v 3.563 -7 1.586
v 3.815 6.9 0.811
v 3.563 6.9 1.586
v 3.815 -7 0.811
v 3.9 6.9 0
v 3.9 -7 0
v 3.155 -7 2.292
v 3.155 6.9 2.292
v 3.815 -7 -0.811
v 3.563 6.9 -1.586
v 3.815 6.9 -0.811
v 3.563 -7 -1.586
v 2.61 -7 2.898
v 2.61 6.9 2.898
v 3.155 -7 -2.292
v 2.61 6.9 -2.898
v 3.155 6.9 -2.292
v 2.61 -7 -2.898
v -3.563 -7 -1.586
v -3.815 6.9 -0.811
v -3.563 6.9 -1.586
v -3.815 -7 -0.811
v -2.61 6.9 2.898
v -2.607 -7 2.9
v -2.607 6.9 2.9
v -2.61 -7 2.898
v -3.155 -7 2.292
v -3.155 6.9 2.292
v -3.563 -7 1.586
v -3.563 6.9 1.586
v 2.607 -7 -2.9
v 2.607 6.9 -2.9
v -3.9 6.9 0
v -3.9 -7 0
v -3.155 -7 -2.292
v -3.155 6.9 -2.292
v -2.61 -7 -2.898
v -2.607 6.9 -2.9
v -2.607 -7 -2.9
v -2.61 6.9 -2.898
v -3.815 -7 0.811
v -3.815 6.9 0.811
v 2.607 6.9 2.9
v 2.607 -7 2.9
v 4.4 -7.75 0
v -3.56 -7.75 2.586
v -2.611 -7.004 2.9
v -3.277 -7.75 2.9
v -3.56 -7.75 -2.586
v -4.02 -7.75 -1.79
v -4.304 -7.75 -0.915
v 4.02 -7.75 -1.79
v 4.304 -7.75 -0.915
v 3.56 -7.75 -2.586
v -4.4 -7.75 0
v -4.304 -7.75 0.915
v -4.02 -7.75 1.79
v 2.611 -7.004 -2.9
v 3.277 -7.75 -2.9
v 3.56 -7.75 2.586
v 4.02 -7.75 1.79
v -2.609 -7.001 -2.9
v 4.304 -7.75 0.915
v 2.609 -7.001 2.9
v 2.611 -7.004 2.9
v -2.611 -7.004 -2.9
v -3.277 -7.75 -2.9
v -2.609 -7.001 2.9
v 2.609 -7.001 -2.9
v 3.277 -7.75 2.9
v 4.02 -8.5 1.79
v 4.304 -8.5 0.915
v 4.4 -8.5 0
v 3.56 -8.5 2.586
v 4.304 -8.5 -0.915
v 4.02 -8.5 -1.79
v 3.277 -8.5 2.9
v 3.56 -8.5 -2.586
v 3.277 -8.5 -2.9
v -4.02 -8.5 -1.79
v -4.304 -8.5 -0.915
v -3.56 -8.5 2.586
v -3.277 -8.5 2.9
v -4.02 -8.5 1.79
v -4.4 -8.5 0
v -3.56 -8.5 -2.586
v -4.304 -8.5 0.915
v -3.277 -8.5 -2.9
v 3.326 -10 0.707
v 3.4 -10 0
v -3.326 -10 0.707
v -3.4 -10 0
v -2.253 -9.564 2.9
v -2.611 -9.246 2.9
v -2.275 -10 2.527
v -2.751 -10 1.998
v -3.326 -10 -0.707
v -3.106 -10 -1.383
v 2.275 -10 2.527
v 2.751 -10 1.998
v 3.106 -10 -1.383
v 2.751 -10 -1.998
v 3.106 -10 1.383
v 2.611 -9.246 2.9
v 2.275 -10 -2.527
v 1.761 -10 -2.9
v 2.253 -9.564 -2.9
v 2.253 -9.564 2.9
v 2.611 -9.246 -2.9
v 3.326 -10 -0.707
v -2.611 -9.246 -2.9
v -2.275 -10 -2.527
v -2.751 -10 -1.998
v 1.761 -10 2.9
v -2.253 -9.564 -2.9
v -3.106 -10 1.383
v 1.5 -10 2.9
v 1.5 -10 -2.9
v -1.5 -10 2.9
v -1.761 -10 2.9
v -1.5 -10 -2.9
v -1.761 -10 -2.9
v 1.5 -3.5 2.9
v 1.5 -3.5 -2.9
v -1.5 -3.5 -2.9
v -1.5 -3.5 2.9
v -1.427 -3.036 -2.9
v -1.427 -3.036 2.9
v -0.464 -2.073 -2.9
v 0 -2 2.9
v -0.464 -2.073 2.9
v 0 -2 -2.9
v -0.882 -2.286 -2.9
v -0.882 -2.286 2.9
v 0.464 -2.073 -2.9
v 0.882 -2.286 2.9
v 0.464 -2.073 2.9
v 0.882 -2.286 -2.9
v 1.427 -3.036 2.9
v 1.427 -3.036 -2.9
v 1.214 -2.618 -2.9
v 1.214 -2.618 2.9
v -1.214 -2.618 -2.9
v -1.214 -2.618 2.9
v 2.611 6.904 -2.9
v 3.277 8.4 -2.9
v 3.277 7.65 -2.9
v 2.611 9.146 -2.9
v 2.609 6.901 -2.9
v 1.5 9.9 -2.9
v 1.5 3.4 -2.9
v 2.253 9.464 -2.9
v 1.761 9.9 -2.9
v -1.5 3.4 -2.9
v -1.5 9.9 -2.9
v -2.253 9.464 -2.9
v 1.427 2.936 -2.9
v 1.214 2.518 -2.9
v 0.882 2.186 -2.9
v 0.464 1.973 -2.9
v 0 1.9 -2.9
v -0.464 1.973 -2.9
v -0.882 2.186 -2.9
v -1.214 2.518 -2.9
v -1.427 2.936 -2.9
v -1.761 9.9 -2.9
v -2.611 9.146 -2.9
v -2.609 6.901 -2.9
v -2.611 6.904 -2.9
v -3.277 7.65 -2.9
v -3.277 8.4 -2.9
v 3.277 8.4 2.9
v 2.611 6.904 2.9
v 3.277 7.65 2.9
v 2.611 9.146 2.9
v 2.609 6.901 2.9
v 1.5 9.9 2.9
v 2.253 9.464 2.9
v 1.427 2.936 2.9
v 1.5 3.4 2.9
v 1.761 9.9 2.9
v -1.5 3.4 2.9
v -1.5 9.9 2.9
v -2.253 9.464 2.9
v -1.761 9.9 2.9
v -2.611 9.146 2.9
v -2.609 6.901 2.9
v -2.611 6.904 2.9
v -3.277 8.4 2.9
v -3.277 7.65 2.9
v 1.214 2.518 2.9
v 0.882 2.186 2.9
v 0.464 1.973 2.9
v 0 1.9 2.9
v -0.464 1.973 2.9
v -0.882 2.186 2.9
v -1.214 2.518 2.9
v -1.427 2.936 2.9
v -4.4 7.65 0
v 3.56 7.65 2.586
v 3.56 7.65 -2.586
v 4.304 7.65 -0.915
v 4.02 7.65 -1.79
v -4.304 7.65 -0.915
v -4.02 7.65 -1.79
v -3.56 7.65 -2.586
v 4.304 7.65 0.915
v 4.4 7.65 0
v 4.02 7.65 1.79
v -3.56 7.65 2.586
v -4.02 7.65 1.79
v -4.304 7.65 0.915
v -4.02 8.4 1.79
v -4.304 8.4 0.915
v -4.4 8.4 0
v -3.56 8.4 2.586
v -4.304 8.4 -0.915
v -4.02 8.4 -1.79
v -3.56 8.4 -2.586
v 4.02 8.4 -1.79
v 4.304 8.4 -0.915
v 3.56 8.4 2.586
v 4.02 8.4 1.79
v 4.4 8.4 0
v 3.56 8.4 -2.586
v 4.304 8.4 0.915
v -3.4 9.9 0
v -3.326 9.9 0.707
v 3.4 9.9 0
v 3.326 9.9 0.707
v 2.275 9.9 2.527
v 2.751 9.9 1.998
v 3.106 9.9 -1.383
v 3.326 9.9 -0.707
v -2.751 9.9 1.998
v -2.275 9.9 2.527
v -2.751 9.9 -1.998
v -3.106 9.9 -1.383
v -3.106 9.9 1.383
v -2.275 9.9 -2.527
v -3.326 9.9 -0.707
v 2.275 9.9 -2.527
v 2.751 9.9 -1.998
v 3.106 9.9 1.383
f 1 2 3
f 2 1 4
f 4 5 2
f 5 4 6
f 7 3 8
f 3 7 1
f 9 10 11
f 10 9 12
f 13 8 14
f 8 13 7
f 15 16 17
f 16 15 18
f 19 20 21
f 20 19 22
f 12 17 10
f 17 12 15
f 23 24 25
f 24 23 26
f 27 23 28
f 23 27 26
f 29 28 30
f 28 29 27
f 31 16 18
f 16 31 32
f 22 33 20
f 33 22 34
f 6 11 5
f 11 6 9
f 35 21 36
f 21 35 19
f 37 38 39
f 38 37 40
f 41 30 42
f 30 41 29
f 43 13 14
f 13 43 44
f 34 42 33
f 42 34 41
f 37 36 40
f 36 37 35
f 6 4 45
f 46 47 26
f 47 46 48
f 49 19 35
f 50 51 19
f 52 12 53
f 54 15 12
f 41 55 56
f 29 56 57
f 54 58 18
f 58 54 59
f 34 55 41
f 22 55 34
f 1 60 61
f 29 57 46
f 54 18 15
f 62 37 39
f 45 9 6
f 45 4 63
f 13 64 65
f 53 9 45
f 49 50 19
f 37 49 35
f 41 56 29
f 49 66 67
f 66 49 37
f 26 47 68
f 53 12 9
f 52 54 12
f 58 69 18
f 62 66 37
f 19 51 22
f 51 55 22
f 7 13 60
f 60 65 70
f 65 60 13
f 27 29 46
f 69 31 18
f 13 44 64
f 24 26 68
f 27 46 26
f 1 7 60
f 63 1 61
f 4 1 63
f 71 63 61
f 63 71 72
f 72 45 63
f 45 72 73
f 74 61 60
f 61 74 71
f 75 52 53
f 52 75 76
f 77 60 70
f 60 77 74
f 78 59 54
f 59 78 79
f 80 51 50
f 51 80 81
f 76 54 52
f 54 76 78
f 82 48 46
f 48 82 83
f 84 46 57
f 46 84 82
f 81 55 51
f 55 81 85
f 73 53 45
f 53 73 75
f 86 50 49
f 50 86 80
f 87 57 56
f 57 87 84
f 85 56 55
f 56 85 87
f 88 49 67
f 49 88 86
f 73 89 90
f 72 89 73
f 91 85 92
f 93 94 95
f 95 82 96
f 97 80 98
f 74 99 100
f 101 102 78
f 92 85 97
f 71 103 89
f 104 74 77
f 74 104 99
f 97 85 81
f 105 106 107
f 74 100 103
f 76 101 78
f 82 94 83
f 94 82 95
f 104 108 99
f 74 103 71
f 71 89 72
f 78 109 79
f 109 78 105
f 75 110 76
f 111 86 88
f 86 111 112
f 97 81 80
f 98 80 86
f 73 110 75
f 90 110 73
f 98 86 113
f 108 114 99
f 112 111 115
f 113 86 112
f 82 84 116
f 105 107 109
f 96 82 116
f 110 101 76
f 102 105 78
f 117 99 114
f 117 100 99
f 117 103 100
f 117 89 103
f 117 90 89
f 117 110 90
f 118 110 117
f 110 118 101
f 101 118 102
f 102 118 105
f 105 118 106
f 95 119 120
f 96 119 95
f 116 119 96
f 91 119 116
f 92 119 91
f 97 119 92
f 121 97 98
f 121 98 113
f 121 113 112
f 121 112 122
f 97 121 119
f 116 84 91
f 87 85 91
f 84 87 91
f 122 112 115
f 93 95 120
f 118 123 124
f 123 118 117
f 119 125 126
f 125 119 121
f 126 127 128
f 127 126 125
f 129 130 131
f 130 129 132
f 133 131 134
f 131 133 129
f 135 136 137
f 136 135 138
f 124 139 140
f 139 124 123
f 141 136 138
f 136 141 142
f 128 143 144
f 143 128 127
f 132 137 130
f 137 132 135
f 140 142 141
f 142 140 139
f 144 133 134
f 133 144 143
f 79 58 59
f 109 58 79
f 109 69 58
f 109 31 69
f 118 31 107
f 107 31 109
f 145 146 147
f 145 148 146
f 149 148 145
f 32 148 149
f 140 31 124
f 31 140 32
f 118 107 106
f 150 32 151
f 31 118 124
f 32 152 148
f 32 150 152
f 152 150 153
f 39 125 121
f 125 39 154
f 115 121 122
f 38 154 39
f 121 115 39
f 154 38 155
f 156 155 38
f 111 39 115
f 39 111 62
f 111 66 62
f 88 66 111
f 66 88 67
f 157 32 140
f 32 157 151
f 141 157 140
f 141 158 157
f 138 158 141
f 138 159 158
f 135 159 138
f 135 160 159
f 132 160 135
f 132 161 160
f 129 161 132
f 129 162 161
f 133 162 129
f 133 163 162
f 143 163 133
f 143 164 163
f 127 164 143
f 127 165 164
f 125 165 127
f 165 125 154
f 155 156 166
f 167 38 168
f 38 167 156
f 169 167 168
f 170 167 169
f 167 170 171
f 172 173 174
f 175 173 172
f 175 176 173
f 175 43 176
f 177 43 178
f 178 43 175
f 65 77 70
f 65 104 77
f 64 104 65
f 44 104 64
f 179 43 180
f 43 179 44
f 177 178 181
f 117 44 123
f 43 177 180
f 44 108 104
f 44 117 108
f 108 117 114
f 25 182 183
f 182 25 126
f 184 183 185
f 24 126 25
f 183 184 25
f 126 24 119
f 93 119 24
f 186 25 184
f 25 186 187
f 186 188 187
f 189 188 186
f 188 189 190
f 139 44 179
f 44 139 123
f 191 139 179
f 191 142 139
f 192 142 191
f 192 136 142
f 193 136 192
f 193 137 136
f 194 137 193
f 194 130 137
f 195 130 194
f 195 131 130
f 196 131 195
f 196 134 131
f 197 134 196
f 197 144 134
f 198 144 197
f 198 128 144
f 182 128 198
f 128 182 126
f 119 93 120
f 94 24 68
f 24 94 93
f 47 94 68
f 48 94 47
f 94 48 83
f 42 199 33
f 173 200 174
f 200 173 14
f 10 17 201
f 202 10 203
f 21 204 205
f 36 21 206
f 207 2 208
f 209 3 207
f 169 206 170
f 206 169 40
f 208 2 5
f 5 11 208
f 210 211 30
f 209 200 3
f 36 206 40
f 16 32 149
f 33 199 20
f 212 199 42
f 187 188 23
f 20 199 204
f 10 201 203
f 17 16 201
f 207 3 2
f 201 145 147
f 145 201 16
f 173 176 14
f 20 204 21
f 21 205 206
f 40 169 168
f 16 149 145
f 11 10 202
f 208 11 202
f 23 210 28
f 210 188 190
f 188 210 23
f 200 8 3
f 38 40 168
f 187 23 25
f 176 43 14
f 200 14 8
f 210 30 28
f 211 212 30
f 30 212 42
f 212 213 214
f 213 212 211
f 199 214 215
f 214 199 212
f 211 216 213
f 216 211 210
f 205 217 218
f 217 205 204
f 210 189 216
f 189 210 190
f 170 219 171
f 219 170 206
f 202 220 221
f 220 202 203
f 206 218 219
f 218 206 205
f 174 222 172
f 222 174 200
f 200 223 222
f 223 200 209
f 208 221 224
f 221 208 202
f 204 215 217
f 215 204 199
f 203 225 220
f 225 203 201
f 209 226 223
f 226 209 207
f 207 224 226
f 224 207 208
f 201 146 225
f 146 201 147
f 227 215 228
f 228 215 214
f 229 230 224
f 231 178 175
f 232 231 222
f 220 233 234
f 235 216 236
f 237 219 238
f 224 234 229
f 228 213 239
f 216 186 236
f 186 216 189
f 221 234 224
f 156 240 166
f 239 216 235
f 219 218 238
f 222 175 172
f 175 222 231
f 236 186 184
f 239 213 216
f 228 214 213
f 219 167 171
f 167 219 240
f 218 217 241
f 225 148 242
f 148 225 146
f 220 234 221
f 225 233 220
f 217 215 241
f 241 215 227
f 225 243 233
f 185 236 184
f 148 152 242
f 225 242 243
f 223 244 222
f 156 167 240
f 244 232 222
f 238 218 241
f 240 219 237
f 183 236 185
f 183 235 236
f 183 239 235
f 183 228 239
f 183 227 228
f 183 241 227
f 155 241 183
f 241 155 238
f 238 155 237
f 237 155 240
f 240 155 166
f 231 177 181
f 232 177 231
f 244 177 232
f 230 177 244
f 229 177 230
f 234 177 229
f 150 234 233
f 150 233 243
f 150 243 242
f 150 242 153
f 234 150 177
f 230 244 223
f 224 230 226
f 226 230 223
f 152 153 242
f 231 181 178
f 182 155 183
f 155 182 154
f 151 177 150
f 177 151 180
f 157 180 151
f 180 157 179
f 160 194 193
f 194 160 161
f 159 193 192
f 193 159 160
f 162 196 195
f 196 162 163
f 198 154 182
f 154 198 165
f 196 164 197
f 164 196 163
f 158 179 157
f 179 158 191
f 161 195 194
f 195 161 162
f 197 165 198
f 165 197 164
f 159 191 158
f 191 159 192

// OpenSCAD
// file: pin_joints.scad
include <pins.scad>

// default is 0.3
tolerance = 0.3;

// pinpeg(h=40);
// pin();
// pin(side=true);
// pinhole(t=tolerance);
// pintack(h=10, r=4);
//pins();

// wheel();
// translate([-25/2, 0, 0]) axel_tight();
// translate([-25/2, 0, 0]) axel_loose();
// translate([-25/2, 0, 0]) axel_loose_and_tight();
//plate();
//plate_simple();

module pins() {
  translate([-21, 0, 0]) pinpeg(h=20);
  translate([0, 0, 0]) pintack(h=11);
  translate([21, 0, 0]) pintack(h=11);
}

module wheel() {
  difference() {
    union() {
      translate([0, 0, 10]) cylinder(h=5, r1=20/2, r2=17/2);
      translate([0, 0, 5]) cylinder(h=5, r=20/2);
      translate([0, 0, 0]) cylinder(h=5, r1=17/2, r2=20/2);
    }

    translate([0, 0, 11]) cylinder(h=15, r=13/2);    
    pinhole(h=5, t=tolerance);
  }  
}

module axel_tight() {
  difference() {
    union() {
      translate([0, -2.5, 0]) cube([25, 5, 5]);
      cylinder(h=5, r=5*1.75);
      translate([25, 0, 0]) cylinder(h=12, r=5*1.75);
    }
  
    pinhole(h=5, t=tolerance);
    translate([25, 0, 10+2]) rotate([180, 0, 0]) pinhole(h=8, t=tolerance);
  }
}

module axel_loose() {
  difference() {
    union() {
      translate([0, -2.5, 0]) cube([25, 5, 5]);
      cylinder(h=5, r=5*1.75);
      translate([25, 0, 0]) cylinder(h=5, r=5*1.75);
    }
  
    translate([0, 0, 5]) rotate([180, 0, 0]) pinhole(h=5, t=tolerance, tight=false);
    translate([25, 0, 0]) pinhole(h=5, t=tolerance, tight=false);
  }
}

module axel_loose_and_tight() {
  difference() {
    union() {
      translate([0, -2.5, 0]) cube([25, 5, 5]);
      cylinder(h=5, r=5*1.75);
      translate([25, 0, 0]) cylinder(h=5, r=5*1.75);
    }
  
    pinhole(h=10, t=tolerance);
    translate([25, 0, 0]) pinhole(h=10, t=tolerance, tight=false);
  }
}

module plate() {
  %translate([0, 0, -0.5]) cube([100, 100, 1], center=true);
  
  translate([0, 21, 0]) pins();

  translate([-21, 0, 0]) wheel();

  translate([-21, -21, 0]) wheel();

  translate([0, 0, 0]) axel_tight();

  translate([0, -20, 0]) axel_loose();
}

module plate_simple() {
  %translate([0, 0, -0.5]) cube([100, 100, 1], center=true);
  
 translate([-10.5, 10.5, 0]) pintack(h=11);
 translate([10.5, 10.5, 0]) pintack(h=11);
 translate([-25/2, -10.5, 0]) axel_loose_and_tight();
  
}
// file: pins.scad
// Pin Connectors V3
// Tony Buser <tbuser@gmail.com>
// Modified by Emmett Lalish

//pinhole(tight=true,fixed=false);
//pin_vertical();

// test();
// pintack(h=10);
// pinpeg(h=20);


module test() {
  tolerance = 0.3;
  
  translate([-12, 12, 0]) pinpeg(h=20);
  translate([12, 12, 0]) pintack(h=10);
  
  difference() {
    union() {
      translate([0, -12, 2.5]) cube(size = [59, 20, 5], center = true);
      translate([24, -12, 7.5]) cube(size = [12, 20, 15], center = true);
    }
    translate([-24, -12, 0]) pinhole(h=5, t=tolerance);
    translate([-12, -12, 0]) pinhole(h=5, t=tolerance, tight=false);
    translate([0, -12, 0]) pinhole(h=10, t=tolerance);
    translate([12, -12, 0]) pinhole(h=10, t=tolerance, tight=false);
    translate([24, -12, 15]) rotate([0, 180, 0]) pinhole(h=10, t=tolerance);
  }
}

module pinhole(h=10, r=4, lh=3, lt=1, t=0.3, tight=true, fixed=false) {
  // h = shaft height
  // r = shaft radius
  // lh = lip height
  // lt = lip thickness
  // t = extra tolerance for loose fit
  // tight = set to false if you want a joint that spins easily
  // fixed = set to true so pins can't spin
  
intersection(){
  union() {
	if (tight == true || fixed == true) {
      pin_solid(h, r, lh, lt);
	  translate([0,0,-t/2])cylinder(h=h+t, r=r, $fn=30);
	} else {
	  pin_solid(h, r+t/2, lh, lt);
	  translate([0,0,-t/2])cylinder(h=h+t, r=r+t/2, $fn=30);
	}
    
    
    // widen the entrance hole to make insertion easier
    //translate([0, 0, -0.1]) cylinder(h=lh/3, r2=r, r1=r+(t/2)+(lt/2),$fn=30);
  }
  if (fixed == true) {
	translate([-r*2, -r*0.75, -1])cube([r*4, r*1.5, h+2]);
  }
}}

module pin(h=10, r=4, lh=3, lt=1, t=0.2, side=false) {
  // h = shaft height
  // r = shaft radius
  // lh = lip height
  // lt = lip thickness
  // side = set to true if you want it printed horizontally

  if (side) {
    pin_horizontal(h, r, lh, lt, t);
  } else {
    pin_vertical(h, r, lh, lt, t);
  }
}

module pintack(h=10, r=4, lh=3, lt=1, t=0.2, bh=3, br=8.75) {
  // bh = base_height
  // br = base_radius
  
  union() {
    cylinder(h=bh, r=br);
    translate([0, 0, bh]) pin(h, r, lh, lt, t);
  }
}

module pinpeg(h=20, r=4, lh=3, lt=1, t=0.2) {
  union() {
    translate([0,-0.05, 0]) pin(h/2+0.1, r, lh, lt, t, side=true);
    translate([0,0.05, 0]) rotate([0, 0, 180]) pin(h/2+0.1, r, lh, lt, t, side=true);
  }
}

// just call pin instead, I made this module because it was easier to do the rotation option this way
// since openscad complains of recursion if I did it all in one module
module pin_vertical(h=10, r=4, lh=3, lt=1, t=0.2) {
  // h = shaft height
  // r = shaft radius
  // lh = lip height
  // lt = lip thickness

  difference() {
    pin_solid(h, r-t/2, lh, lt);
    
    // center cut
    translate([-lt*3/2, -(r*2+lt*2)/2, h/5+lt*3/2]) cube([lt*3, r*2+lt*2, h]);
    //translate([0, 0, h/4]) cylinder(h=h+lh, r=r/2.5, $fn=20);
    // center curve
    translate([0, 0, h/5+lt*3/2]) rotate([90, 0, 0]) cylinder(h=r*2, r=lt*3/2, center=true, $fn=20);
  
    // side cuts
    translate([-r*2, -r-r*0.75+t/2, -1]) cube([r*4, r, h+2]);
    translate([-r*2, r*0.75-t/2, -1]) cube([r*4, r, h+2]);
  }
}

// call pin with side=true instead of this
module pin_horizontal(h=10, r=4, lh=3, lt=1, t=0.2) {
  // h = shaft height
  // r = shaft radius
  // lh = lip height
  // lt = lip thickness
  translate([0, 0, r*0.75-t/2]) rotate([-90, 0, 0]) pin_vertical(h, r, lh, lt, t);
}

// this is mainly to make the pinhole module easier
module pin_solid(h=10, r=4, lh=3, lt=1) {
  union() {
    // shaft
    cylinder(h=h-lh, r=r, $fn=30);
    // lip
    // translate([0, 0, h-lh]) cylinder(h=lh*0.25, r1=r, r2=r+(lt/2), $fn=30);
    // translate([0, 0, h-lh+lh*0.25]) cylinder(h=lh*0.25, r2=r, r1=r+(lt/2), $fn=30);
    // translate([0, 0, h-lh+lh*0.50]) cylinder(h=lh*0.50, r1=r, r2=r-(lt/2), $fn=30);

    // translate([0, 0, h-lh]) cylinder(h=lh*0.50, r1=r, r2=r+(lt/2), $fn=30);
    // translate([0, 0, h-lh+lh*0.50]) cylinder(h=lh*0.50, r1=r+(lt/2), r2=r-(lt/3), $fn=30);    

    translate([0, 0, h-lh]) cylinder(h=lh*0.25, r1=r, r2=r+(lt/2), $fn=30);
    translate([0, 0, h-lh+lh*0.25]) cylinder(h=lh*0.25, r=r+(lt/2), $fn=30);    
    translate([0, 0, h-lh+lh*0.50]) cylinder(h=lh*0.50, r1=r+(lt/2), r2=r-(lt/2), $fn=30);    

    // translate([0, 0, h-lh]) cylinder(h=lh, r1=r+(lt/2), r2=1, $fn=30);
    // translate([0, 0, h-lh-lt/2]) cylinder(h=lt/2, r1=r, r2=r+(lt/2), $fn=30);
  }
}

module pinshaft(h=10, r=4, t=0.2, side=false){
flip=side ? 1 : 0;
translate(flip*[0,h/2,r*0.75-t/2])rotate(flip*[90,0,0])
intersection(){
	cylinder(h=h, r=r-t/2, $fn=30);
	translate([-r*2, -r*0.75+t/2, -1])cube([r*4, r*1.5-t, h+2]);
}
}
// main file
include <pins.scad>
include <pin_joints.scad>

rotate([90,0,0])

union(){
	pin();
	translate([0,0,0.1])rotate([0,180,0])pin();
}
